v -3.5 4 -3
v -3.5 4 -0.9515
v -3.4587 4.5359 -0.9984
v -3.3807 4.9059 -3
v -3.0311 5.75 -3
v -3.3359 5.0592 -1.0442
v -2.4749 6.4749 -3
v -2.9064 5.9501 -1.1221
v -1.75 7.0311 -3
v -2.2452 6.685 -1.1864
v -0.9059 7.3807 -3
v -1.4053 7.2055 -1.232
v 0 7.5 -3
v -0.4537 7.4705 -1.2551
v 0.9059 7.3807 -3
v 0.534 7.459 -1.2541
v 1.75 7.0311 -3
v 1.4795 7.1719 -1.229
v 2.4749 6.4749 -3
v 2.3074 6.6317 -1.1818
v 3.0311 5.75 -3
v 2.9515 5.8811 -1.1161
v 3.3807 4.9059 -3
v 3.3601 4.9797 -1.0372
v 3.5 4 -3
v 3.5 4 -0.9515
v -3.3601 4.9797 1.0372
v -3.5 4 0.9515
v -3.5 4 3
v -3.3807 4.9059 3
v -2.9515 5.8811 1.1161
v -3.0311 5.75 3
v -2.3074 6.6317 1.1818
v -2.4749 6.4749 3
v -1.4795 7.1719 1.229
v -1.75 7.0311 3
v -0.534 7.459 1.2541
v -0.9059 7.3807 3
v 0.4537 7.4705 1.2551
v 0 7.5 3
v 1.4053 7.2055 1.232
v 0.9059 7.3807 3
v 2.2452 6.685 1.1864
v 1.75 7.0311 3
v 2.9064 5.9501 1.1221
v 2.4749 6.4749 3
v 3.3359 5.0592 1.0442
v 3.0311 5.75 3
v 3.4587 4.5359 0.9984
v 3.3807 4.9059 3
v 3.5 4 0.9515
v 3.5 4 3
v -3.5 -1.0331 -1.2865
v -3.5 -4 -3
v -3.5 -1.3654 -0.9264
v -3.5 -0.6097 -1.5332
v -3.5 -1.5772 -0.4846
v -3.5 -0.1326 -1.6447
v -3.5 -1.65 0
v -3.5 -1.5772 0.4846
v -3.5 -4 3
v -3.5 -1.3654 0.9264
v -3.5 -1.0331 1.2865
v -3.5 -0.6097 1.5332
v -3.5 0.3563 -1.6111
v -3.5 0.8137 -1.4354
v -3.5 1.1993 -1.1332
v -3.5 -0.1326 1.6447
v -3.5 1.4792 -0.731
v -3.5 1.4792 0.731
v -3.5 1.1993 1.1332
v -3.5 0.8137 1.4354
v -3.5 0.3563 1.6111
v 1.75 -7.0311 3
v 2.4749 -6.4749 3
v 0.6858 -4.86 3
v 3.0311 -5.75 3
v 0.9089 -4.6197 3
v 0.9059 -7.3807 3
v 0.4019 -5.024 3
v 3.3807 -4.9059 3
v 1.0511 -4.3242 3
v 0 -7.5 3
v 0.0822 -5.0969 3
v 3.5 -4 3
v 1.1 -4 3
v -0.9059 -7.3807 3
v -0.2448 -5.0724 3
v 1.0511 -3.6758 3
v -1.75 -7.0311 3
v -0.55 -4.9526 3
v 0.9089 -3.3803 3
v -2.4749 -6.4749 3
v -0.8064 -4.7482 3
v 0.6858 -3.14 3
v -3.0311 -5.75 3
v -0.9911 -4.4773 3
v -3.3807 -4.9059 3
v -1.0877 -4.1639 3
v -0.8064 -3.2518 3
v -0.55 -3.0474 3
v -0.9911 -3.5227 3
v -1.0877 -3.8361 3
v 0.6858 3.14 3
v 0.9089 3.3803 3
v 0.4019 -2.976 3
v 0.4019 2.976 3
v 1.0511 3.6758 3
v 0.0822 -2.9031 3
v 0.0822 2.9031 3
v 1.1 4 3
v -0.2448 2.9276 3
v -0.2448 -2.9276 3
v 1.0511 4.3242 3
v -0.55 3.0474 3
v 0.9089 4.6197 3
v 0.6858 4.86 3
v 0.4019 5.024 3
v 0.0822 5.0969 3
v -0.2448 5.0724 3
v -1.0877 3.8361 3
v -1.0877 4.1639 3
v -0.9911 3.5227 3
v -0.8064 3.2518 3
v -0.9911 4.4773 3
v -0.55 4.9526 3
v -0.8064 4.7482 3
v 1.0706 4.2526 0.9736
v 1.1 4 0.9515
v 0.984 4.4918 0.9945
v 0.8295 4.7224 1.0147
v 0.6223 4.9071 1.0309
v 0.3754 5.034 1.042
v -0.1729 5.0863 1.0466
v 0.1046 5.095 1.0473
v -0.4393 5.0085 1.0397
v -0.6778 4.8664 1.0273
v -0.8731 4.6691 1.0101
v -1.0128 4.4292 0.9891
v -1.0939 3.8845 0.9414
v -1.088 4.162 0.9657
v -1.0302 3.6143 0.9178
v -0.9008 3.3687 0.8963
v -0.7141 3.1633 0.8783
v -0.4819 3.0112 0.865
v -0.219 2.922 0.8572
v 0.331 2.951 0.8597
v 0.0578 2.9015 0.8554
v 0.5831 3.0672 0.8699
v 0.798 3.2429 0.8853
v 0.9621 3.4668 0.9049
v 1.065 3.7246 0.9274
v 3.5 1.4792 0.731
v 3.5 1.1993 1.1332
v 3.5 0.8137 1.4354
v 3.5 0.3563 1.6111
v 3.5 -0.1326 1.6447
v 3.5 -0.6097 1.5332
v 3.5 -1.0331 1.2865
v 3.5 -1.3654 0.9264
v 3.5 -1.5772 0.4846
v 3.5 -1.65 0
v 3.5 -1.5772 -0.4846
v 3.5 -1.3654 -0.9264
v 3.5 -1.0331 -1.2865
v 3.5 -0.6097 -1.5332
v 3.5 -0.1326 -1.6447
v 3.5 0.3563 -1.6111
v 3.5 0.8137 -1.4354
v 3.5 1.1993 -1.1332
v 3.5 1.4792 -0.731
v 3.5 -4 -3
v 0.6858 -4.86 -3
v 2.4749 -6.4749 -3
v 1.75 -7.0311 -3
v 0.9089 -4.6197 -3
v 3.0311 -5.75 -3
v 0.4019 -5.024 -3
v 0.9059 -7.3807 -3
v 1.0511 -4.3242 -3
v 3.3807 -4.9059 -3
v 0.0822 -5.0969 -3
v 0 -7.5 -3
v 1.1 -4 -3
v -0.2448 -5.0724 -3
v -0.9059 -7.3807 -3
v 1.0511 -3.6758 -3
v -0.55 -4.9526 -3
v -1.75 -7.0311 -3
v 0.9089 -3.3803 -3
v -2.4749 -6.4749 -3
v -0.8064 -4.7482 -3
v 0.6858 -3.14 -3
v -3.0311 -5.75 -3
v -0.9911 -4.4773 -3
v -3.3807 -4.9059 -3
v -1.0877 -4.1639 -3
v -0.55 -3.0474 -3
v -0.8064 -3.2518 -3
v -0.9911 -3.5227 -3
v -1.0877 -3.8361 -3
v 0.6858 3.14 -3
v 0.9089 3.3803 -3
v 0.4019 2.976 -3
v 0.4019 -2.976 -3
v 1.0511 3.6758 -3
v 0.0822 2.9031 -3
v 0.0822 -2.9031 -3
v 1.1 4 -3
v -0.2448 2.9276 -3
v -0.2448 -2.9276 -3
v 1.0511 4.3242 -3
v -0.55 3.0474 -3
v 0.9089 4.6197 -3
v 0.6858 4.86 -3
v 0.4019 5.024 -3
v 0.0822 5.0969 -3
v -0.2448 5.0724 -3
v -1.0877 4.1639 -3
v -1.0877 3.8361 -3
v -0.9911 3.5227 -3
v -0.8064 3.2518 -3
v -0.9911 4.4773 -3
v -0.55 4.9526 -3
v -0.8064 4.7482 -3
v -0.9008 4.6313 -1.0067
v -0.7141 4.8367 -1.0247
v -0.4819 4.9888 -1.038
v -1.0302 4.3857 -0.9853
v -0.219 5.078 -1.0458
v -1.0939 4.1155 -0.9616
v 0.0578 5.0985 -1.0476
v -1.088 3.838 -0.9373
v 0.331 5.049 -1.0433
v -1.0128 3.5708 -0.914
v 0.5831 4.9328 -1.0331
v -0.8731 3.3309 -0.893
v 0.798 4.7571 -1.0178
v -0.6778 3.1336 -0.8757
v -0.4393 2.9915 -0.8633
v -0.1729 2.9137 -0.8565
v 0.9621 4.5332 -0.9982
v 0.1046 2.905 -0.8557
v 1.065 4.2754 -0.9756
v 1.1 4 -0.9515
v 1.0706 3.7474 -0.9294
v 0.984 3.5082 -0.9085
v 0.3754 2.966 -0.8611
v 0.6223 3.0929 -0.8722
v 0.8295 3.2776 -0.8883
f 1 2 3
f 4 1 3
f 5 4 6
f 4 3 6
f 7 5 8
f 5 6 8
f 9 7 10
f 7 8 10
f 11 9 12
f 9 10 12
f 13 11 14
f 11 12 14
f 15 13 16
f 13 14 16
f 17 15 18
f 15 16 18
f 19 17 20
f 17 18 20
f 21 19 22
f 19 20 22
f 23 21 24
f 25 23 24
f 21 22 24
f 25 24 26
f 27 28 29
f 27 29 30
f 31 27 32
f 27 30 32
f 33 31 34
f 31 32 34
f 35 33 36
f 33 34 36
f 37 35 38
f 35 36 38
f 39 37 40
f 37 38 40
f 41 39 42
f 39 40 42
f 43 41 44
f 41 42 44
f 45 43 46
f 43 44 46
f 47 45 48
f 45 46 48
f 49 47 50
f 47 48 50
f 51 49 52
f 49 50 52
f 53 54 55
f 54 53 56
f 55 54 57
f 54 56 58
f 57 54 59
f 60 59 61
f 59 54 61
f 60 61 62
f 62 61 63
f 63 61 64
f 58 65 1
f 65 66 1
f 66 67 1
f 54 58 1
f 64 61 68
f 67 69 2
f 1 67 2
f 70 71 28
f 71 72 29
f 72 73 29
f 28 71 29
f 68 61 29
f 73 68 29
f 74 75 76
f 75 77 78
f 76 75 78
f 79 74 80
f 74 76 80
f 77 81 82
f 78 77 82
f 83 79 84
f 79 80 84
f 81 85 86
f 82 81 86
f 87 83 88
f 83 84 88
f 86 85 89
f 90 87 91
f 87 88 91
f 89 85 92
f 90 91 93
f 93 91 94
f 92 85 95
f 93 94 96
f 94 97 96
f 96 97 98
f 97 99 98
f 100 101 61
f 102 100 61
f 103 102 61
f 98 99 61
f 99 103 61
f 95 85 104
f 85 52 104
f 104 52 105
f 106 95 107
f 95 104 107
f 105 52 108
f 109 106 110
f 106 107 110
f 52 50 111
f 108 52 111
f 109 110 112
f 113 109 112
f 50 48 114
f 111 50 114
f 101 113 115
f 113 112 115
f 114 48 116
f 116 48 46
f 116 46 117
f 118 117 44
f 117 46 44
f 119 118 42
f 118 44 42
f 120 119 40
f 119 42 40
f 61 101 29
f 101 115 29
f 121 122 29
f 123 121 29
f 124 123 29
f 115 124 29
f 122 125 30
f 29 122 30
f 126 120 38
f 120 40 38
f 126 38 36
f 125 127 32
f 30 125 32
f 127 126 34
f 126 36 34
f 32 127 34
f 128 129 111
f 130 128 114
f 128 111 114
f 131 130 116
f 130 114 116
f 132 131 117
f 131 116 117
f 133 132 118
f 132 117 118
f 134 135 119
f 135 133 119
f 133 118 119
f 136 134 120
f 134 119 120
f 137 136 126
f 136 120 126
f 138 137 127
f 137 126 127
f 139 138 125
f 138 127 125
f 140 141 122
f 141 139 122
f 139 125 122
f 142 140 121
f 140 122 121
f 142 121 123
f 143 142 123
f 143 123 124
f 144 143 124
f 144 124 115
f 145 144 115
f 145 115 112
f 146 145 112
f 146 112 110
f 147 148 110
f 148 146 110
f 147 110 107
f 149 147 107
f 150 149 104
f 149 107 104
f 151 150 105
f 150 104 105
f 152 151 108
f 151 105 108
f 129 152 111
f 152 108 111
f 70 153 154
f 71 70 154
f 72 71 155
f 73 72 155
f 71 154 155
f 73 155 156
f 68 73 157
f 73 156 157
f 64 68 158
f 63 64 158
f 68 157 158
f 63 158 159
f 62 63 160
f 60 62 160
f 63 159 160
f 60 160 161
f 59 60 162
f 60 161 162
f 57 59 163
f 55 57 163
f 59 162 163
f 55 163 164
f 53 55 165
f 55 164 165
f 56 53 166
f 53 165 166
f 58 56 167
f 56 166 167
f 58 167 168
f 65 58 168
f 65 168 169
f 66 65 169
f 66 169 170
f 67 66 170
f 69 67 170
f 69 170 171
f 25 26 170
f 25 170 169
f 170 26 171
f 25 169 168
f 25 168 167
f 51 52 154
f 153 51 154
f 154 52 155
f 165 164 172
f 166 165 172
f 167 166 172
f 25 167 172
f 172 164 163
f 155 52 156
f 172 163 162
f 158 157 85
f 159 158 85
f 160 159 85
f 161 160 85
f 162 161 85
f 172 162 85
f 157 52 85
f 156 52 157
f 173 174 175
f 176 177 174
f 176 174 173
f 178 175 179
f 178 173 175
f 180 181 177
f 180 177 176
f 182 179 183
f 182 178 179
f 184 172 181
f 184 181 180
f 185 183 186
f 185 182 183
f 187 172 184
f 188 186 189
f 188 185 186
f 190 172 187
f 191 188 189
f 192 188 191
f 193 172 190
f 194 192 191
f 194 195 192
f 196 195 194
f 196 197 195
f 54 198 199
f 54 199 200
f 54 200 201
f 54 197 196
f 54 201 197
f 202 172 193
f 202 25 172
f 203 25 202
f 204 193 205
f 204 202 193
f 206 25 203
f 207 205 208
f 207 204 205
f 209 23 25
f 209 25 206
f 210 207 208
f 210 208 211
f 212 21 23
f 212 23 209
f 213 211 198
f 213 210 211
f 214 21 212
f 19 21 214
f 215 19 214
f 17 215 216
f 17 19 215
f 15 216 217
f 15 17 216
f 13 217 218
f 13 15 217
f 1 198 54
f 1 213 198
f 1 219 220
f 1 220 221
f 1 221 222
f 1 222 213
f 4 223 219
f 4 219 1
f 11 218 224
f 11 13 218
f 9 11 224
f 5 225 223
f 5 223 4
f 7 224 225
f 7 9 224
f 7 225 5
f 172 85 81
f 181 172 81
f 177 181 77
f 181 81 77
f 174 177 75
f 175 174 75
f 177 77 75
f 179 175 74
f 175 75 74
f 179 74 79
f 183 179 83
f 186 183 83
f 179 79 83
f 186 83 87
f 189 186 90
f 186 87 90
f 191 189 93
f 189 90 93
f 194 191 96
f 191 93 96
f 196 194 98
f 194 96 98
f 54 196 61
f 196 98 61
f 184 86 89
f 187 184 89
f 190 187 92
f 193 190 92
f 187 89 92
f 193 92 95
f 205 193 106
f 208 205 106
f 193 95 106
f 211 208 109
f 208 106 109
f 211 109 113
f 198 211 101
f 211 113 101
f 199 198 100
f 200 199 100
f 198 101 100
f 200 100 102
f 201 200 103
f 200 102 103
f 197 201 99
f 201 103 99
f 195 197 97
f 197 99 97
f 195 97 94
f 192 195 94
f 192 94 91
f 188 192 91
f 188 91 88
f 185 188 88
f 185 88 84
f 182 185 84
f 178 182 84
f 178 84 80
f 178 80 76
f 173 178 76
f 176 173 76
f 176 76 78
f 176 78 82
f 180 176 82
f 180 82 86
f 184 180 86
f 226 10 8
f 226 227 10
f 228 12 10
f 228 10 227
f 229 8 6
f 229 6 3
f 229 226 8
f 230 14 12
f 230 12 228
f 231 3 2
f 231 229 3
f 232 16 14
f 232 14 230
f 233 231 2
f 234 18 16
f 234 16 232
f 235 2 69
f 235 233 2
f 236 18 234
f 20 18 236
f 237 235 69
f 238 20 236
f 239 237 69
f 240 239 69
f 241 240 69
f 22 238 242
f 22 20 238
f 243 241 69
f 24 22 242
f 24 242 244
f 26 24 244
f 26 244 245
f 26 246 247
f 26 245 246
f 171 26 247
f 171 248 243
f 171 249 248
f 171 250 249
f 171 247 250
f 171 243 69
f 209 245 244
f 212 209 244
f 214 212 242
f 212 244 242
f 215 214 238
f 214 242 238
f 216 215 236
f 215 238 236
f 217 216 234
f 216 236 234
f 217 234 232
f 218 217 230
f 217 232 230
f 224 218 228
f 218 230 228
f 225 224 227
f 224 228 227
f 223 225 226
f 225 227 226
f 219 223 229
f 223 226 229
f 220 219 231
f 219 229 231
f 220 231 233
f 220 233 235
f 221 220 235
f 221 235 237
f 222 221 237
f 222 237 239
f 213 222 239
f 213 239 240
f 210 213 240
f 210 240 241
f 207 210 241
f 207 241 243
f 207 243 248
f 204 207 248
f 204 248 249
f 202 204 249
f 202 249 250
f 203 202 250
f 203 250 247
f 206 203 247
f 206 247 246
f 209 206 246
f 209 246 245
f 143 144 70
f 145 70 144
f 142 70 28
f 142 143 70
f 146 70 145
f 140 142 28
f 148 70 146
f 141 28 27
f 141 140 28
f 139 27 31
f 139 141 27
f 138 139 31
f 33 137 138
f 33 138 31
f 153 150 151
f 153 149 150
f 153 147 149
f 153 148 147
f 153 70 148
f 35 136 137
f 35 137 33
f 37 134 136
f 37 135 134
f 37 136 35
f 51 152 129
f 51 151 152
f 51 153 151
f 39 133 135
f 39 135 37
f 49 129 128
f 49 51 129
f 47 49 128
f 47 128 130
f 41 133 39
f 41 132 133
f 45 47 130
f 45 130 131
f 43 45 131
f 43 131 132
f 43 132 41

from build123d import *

# Parameters (mm, degrees)
EXTRUDE_1_DEPTH     = 3
SKETCH_2_R          = 1.65
CUT_EXTRUDE_2_DEPTH = 23
SKETCH_3_R          = 1.1
CUT_EXTRUDE_3_DEPTH = 23
SKETCH_4_R          = 1.1
CUT_EXTRUDE_4_DEPTH = 23


with BuildPart() as part:
    # 草图1 → 凸台-拉伸1 (new, symmetric)
    with BuildSketch(Plane.XY):
        with BuildLine():
            Line((-3.5, -4), (-3.5, 4))
            ThreePointArc((-3.5, 4), (0, 7.5), (3.5, 4))
            Line((3.5, 4), (3.5, -4))
            ThreePointArc((3.5, -4), (0, -7.5), (-3.5, -4))
        make_face()
    extrude(amount=EXTRUDE_1_DEPTH, both=True)

    # 草图2 → 切除-拉伸2 (cut)
    with BuildSketch(Plane(origin=(3.5, 0, 0), x_dir=(0, 0, -1), z_dir=(1, 0, 0))):
        Circle(SKETCH_2_R)
        Polygon((-0.730979877, 1.479245895), (-1.405289173, 9.186636415), (1.405289173, 9.186636415), (0.730979877, 1.479245895), (0, 1.479245895), align=None)
    extrude(amount=-CUT_EXTRUDE_2_DEPTH, mode=Mode.SUBTRACT)

    # 草图3 → 切除-拉伸3 (cut)
    with BuildSketch(Plane.XY.offset(3)):
        with Locations((0, 4)):
            Circle(SKETCH_3_R)
    extrude(amount=-CUT_EXTRUDE_3_DEPTH, mode=Mode.SUBTRACT)

    # 草图4 → 切除-拉伸4 (cut)
    with BuildSketch(Plane.XY.offset(3)):
        with Locations((0, -4)):
            Circle(SKETCH_4_R)
    extrude(amount=-CUT_EXTRUDE_4_DEPTH, mode=Mode.SUBTRACT)


solid = part.part
